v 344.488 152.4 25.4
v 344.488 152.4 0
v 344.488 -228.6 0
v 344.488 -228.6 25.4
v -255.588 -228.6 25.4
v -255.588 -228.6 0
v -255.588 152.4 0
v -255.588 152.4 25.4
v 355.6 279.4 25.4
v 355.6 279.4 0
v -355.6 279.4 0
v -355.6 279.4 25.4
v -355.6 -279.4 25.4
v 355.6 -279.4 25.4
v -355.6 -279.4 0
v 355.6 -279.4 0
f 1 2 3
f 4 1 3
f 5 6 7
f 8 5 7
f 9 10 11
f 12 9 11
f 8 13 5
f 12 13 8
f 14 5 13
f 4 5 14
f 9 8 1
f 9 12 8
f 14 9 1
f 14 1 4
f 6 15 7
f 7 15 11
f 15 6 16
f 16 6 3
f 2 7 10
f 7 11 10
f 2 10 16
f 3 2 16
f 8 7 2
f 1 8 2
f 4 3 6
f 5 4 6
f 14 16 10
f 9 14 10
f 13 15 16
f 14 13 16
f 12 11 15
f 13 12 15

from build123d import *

# Parameters (mm, degrees)
F0_W     = 100.0125
F0_H     = 127
F0_H_2   = 50.8
F0_W_2   = 11.1125
F1_DEPTH = 25.4


with BuildPart() as f1:
    # F0 (on Top) → F1 (new body)
    with BuildSketch(Plane.XY):
        with Locations((-305.59375, 215.9)):
            Rectangle(F0_W, F0_H)
        with Locations((-205.58125, 215.9)):
            Rectangle(F0_W, F0_H)
        with Locations((-305.59375, 88.9)):
            Rectangle(F0_W, F0_H)
        with Locations((-105.56875, 215.9)):
            Rectangle(F0_W, F0_H)
        with Locations((-305.59375, -38.1)):
            Rectangle(F0_W, F0_H)
        with Locations((-5.55625, 215.9)):
            Rectangle(F0_W, F0_H)
        with Locations((-305.59375, -165.1)):
            Rectangle(F0_W, F0_H)
        with Locations((94.45625, 215.9)):
            Rectangle(F0_W, F0_H)
        with Locations((-305.59375, -254)):
            Rectangle(F0_W, F0_H_2)
        with Locations((194.46875, 215.9)):
            Rectangle(F0_W, F0_H)
        with Locations((-205.58125, -254)):
            Rectangle(F0_W, F0_H_2)
        with Locations((294.48125, 215.9)):
            Rectangle(F0_W, F0_H)
        with Locations((-105.56875, -254)):
            Rectangle(F0_W, F0_H_2)
        with Locations((350.04375, 215.9)):
            Rectangle(F0_W_2, F0_H)
        with Locations((-5.55625, -254)):
            Rectangle(F0_W, F0_H_2)
        with Locations((350.04375, 88.9)):
            Rectangle(F0_W_2, F0_H)
        with Locations((94.45625, -254)):
            Rectangle(F0_W, F0_H_2)
        with Locations((350.04375, -38.1)):
            Rectangle(F0_W_2, F0_H)
        with Locations((194.46875, -254)):
            Rectangle(F0_W, F0_H_2)
        with Locations((350.04375, -165.1)):
            Rectangle(F0_W_2, F0_H)
        with Locations((294.48125, -254)):
            Rectangle(F0_W, F0_H_2)
        with Locations((350.04375, -254)):
            Rectangle(F0_W_2, F0_H_2)
    extrude(amount=F1_DEPTH)


solid = f1.part
